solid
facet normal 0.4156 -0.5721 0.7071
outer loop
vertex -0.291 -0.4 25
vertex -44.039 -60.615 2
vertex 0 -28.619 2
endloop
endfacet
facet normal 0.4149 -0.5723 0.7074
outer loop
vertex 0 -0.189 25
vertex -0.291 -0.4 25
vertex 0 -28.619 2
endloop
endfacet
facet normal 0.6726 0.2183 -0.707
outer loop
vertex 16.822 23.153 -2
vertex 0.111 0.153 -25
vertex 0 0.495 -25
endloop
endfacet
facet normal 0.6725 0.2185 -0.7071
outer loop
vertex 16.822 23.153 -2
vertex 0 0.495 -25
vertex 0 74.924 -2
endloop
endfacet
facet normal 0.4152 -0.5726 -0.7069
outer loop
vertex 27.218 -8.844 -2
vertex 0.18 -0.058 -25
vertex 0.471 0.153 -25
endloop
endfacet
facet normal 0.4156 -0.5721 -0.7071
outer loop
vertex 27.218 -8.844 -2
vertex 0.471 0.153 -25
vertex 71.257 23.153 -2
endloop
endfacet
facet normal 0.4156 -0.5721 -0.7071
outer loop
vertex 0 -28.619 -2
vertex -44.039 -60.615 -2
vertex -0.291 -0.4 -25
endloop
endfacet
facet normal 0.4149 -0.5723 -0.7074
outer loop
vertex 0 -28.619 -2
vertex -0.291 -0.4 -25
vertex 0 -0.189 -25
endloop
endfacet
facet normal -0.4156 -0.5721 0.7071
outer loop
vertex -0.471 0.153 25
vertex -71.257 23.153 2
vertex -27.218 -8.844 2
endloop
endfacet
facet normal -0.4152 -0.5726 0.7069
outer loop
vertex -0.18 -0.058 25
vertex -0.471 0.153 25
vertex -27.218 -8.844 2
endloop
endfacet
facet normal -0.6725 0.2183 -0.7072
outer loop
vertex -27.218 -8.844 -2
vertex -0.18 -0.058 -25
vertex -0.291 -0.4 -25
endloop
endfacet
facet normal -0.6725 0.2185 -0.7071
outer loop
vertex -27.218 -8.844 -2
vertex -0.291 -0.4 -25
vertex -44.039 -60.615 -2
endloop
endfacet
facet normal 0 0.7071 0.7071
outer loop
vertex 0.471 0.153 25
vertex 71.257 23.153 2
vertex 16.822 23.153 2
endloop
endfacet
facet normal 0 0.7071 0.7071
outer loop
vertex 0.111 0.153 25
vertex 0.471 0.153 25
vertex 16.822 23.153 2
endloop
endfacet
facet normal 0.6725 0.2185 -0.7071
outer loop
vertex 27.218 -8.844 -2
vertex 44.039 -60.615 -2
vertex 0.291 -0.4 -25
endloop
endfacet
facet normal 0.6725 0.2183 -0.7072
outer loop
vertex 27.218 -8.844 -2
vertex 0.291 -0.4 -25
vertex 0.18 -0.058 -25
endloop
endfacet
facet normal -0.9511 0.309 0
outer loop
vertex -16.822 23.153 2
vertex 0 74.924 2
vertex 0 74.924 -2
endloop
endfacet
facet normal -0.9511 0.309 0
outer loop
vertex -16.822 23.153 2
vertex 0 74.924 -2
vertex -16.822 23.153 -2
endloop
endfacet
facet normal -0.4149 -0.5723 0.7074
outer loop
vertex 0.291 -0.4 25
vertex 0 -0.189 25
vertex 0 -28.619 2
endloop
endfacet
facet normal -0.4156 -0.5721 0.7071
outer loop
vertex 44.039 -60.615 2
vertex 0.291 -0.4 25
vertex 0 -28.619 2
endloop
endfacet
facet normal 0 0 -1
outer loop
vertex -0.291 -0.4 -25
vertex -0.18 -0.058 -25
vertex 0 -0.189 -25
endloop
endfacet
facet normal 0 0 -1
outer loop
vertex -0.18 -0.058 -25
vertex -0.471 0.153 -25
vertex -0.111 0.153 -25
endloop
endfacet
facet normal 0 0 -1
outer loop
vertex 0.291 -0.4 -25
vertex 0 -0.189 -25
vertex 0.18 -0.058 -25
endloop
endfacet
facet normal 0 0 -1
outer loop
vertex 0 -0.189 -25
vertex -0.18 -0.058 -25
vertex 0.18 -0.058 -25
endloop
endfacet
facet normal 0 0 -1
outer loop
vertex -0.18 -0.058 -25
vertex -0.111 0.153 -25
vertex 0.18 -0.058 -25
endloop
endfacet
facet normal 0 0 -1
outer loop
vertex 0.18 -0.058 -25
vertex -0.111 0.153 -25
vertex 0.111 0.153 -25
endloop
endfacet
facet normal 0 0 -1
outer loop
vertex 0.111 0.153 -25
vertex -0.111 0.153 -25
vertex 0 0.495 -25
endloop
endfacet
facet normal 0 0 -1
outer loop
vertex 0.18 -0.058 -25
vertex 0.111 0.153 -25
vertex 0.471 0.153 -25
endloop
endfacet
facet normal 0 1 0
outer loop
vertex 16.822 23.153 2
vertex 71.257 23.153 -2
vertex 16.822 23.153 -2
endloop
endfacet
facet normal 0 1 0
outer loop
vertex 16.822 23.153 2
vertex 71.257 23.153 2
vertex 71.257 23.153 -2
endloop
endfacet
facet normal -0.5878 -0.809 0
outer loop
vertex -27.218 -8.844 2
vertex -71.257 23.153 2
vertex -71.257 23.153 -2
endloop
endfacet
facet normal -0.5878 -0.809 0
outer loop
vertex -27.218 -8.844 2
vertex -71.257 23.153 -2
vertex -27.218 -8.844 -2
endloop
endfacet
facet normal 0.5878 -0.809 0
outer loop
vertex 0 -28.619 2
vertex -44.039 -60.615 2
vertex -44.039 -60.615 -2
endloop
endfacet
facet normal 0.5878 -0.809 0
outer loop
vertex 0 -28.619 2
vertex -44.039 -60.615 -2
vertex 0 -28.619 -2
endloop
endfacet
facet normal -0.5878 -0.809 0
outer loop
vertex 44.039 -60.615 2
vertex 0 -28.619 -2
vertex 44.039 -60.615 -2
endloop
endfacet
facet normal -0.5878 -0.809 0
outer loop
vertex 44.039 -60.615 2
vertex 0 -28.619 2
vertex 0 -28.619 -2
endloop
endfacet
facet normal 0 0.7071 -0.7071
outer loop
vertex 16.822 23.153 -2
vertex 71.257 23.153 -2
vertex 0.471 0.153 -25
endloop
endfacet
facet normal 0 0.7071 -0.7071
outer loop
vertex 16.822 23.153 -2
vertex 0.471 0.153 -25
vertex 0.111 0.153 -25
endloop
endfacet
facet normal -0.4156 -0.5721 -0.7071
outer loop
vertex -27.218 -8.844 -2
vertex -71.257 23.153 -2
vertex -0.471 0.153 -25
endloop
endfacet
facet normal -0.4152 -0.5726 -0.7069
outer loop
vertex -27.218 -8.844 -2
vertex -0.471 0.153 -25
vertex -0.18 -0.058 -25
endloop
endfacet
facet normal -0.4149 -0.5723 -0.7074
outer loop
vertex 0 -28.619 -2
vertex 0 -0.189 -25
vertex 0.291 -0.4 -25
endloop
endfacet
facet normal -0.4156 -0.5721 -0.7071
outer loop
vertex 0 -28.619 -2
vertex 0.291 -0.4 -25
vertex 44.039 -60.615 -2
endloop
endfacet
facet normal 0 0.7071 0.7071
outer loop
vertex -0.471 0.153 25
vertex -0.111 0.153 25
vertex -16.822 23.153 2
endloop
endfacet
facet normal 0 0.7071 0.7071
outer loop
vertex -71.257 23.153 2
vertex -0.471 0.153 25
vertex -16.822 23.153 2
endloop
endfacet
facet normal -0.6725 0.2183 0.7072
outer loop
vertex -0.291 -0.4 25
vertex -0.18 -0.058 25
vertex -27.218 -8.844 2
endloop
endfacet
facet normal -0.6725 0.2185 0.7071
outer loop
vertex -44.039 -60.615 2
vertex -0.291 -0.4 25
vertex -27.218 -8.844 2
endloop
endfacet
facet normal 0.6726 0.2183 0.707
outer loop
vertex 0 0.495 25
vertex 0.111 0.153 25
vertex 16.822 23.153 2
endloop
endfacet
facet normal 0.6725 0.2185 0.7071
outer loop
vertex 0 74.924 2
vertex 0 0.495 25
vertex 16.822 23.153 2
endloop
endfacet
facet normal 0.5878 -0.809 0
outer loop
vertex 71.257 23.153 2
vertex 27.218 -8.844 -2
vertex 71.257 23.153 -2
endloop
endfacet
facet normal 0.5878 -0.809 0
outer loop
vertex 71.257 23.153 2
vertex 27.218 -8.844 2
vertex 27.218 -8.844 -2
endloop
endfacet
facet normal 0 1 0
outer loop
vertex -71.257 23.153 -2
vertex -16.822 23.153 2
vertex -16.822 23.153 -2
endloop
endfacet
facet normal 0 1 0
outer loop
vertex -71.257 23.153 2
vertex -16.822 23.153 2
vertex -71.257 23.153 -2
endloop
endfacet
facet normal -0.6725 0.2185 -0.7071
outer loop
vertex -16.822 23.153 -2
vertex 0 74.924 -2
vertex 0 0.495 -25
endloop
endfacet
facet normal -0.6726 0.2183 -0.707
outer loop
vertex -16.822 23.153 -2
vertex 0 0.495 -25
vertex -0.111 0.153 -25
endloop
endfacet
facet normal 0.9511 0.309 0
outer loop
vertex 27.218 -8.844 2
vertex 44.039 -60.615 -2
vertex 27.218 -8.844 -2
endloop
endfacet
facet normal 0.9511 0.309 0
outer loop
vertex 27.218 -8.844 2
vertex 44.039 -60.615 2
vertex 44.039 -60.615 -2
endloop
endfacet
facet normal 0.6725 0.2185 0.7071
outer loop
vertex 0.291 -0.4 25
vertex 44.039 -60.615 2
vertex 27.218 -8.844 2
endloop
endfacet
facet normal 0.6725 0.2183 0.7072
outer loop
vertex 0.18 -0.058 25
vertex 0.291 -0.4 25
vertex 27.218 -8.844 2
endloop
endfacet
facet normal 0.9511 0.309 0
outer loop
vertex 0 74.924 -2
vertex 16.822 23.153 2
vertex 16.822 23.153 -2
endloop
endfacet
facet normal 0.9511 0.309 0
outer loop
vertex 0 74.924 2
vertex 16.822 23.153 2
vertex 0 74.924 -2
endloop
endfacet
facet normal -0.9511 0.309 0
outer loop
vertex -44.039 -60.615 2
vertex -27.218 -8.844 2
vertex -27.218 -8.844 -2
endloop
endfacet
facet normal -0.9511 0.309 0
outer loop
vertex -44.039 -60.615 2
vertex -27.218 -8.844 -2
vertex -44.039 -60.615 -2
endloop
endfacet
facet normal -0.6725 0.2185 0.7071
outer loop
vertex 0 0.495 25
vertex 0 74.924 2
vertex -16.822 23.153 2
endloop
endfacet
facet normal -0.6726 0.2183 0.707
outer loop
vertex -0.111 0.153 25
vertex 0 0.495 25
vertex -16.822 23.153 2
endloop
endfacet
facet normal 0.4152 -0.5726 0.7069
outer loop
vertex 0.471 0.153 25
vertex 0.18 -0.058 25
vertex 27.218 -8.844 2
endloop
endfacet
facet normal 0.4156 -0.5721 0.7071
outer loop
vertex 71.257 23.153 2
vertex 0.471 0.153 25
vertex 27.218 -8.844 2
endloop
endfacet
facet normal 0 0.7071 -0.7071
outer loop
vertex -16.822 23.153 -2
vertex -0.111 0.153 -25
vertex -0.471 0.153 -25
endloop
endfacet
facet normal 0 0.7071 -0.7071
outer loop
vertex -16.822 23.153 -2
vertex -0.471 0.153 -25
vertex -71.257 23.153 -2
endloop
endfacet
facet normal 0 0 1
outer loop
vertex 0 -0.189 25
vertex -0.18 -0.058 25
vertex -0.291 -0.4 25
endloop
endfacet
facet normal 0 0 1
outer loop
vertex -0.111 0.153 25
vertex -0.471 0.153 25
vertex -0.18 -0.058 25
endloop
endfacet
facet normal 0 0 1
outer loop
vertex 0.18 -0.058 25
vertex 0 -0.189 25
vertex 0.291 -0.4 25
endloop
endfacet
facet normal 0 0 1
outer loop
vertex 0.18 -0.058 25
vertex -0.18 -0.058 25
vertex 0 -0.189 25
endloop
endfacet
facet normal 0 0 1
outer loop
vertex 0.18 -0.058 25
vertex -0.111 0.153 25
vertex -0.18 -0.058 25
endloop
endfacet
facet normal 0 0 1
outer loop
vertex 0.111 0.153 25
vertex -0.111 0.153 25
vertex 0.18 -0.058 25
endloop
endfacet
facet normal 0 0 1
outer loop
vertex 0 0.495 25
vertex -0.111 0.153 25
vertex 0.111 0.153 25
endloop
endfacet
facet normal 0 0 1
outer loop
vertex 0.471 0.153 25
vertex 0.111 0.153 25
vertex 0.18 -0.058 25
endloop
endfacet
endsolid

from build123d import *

# Parameters (mm, degrees)
F1_DEPTH = 25
F2_SIZE  = 23


with BuildPart() as f1:
    # F0 (on Top) → F1 (new body)
    with BuildSketch(Plane.XY):
        Polygon((16.8215913544, 23.1529342137), (0, 74.9244689941), (-16.8215913544, 23.1529342137), align=None)
        Polygon((-16.8215913544, 23.1529342137), (-71.2574044668, 23.1529342137), (-27.2179065562, -8.8436339303), align=None)
        Polygon((27.2179065562, -8.8436339303), (71.2574044668, 23.1529342137), (16.8215913544, 23.1529342137), align=None)
        Polygon((-27.2179065562, -8.8436339303), (-44.0394979106, -60.6151687108), (0, -28.6186005667), align=None)
        Polygon((0, -28.6186005667), (44.0394979106, -60.6151687108), (27.2179065562, -8.8436339303), align=None)
        Polygon((16.8215913544, 23.1529342137), (-16.8215913544, 23.1529342137), (-27.2179065562, -8.8436339303), (0, -28.6186005667), (27.2179065562, -8.8436339303), align=None)
    extrude(amount=F1_DEPTH)

    # F2
    f2_edges = [f1.edges().sort_by_distance(p)[0] for p in [
        (8.410796, 49.038702, 25),
        (-8.410796, 49.038702, 25),
        (-44.039498, 23.152934, 25),
        (-49.237656, 7.15465, 25),
        (-35.628702, -34.729401, 25),
        (-22.019749, -44.616885, 25),
        (22.019749, -44.616885, 25),
        (35.628702, -34.729401, 25),
        (49.237656, 7.15465, 25),
        (44.039498, 23.152934, 25),
    ]]
    chamfer(f2_edges, length=F2_SIZE)

    # F3: F1 across plane


with BuildPart() as f1_1:
    add(f1.part)
    add(f1.part.mirror(Plane.XY))


solid = f1_1.part
